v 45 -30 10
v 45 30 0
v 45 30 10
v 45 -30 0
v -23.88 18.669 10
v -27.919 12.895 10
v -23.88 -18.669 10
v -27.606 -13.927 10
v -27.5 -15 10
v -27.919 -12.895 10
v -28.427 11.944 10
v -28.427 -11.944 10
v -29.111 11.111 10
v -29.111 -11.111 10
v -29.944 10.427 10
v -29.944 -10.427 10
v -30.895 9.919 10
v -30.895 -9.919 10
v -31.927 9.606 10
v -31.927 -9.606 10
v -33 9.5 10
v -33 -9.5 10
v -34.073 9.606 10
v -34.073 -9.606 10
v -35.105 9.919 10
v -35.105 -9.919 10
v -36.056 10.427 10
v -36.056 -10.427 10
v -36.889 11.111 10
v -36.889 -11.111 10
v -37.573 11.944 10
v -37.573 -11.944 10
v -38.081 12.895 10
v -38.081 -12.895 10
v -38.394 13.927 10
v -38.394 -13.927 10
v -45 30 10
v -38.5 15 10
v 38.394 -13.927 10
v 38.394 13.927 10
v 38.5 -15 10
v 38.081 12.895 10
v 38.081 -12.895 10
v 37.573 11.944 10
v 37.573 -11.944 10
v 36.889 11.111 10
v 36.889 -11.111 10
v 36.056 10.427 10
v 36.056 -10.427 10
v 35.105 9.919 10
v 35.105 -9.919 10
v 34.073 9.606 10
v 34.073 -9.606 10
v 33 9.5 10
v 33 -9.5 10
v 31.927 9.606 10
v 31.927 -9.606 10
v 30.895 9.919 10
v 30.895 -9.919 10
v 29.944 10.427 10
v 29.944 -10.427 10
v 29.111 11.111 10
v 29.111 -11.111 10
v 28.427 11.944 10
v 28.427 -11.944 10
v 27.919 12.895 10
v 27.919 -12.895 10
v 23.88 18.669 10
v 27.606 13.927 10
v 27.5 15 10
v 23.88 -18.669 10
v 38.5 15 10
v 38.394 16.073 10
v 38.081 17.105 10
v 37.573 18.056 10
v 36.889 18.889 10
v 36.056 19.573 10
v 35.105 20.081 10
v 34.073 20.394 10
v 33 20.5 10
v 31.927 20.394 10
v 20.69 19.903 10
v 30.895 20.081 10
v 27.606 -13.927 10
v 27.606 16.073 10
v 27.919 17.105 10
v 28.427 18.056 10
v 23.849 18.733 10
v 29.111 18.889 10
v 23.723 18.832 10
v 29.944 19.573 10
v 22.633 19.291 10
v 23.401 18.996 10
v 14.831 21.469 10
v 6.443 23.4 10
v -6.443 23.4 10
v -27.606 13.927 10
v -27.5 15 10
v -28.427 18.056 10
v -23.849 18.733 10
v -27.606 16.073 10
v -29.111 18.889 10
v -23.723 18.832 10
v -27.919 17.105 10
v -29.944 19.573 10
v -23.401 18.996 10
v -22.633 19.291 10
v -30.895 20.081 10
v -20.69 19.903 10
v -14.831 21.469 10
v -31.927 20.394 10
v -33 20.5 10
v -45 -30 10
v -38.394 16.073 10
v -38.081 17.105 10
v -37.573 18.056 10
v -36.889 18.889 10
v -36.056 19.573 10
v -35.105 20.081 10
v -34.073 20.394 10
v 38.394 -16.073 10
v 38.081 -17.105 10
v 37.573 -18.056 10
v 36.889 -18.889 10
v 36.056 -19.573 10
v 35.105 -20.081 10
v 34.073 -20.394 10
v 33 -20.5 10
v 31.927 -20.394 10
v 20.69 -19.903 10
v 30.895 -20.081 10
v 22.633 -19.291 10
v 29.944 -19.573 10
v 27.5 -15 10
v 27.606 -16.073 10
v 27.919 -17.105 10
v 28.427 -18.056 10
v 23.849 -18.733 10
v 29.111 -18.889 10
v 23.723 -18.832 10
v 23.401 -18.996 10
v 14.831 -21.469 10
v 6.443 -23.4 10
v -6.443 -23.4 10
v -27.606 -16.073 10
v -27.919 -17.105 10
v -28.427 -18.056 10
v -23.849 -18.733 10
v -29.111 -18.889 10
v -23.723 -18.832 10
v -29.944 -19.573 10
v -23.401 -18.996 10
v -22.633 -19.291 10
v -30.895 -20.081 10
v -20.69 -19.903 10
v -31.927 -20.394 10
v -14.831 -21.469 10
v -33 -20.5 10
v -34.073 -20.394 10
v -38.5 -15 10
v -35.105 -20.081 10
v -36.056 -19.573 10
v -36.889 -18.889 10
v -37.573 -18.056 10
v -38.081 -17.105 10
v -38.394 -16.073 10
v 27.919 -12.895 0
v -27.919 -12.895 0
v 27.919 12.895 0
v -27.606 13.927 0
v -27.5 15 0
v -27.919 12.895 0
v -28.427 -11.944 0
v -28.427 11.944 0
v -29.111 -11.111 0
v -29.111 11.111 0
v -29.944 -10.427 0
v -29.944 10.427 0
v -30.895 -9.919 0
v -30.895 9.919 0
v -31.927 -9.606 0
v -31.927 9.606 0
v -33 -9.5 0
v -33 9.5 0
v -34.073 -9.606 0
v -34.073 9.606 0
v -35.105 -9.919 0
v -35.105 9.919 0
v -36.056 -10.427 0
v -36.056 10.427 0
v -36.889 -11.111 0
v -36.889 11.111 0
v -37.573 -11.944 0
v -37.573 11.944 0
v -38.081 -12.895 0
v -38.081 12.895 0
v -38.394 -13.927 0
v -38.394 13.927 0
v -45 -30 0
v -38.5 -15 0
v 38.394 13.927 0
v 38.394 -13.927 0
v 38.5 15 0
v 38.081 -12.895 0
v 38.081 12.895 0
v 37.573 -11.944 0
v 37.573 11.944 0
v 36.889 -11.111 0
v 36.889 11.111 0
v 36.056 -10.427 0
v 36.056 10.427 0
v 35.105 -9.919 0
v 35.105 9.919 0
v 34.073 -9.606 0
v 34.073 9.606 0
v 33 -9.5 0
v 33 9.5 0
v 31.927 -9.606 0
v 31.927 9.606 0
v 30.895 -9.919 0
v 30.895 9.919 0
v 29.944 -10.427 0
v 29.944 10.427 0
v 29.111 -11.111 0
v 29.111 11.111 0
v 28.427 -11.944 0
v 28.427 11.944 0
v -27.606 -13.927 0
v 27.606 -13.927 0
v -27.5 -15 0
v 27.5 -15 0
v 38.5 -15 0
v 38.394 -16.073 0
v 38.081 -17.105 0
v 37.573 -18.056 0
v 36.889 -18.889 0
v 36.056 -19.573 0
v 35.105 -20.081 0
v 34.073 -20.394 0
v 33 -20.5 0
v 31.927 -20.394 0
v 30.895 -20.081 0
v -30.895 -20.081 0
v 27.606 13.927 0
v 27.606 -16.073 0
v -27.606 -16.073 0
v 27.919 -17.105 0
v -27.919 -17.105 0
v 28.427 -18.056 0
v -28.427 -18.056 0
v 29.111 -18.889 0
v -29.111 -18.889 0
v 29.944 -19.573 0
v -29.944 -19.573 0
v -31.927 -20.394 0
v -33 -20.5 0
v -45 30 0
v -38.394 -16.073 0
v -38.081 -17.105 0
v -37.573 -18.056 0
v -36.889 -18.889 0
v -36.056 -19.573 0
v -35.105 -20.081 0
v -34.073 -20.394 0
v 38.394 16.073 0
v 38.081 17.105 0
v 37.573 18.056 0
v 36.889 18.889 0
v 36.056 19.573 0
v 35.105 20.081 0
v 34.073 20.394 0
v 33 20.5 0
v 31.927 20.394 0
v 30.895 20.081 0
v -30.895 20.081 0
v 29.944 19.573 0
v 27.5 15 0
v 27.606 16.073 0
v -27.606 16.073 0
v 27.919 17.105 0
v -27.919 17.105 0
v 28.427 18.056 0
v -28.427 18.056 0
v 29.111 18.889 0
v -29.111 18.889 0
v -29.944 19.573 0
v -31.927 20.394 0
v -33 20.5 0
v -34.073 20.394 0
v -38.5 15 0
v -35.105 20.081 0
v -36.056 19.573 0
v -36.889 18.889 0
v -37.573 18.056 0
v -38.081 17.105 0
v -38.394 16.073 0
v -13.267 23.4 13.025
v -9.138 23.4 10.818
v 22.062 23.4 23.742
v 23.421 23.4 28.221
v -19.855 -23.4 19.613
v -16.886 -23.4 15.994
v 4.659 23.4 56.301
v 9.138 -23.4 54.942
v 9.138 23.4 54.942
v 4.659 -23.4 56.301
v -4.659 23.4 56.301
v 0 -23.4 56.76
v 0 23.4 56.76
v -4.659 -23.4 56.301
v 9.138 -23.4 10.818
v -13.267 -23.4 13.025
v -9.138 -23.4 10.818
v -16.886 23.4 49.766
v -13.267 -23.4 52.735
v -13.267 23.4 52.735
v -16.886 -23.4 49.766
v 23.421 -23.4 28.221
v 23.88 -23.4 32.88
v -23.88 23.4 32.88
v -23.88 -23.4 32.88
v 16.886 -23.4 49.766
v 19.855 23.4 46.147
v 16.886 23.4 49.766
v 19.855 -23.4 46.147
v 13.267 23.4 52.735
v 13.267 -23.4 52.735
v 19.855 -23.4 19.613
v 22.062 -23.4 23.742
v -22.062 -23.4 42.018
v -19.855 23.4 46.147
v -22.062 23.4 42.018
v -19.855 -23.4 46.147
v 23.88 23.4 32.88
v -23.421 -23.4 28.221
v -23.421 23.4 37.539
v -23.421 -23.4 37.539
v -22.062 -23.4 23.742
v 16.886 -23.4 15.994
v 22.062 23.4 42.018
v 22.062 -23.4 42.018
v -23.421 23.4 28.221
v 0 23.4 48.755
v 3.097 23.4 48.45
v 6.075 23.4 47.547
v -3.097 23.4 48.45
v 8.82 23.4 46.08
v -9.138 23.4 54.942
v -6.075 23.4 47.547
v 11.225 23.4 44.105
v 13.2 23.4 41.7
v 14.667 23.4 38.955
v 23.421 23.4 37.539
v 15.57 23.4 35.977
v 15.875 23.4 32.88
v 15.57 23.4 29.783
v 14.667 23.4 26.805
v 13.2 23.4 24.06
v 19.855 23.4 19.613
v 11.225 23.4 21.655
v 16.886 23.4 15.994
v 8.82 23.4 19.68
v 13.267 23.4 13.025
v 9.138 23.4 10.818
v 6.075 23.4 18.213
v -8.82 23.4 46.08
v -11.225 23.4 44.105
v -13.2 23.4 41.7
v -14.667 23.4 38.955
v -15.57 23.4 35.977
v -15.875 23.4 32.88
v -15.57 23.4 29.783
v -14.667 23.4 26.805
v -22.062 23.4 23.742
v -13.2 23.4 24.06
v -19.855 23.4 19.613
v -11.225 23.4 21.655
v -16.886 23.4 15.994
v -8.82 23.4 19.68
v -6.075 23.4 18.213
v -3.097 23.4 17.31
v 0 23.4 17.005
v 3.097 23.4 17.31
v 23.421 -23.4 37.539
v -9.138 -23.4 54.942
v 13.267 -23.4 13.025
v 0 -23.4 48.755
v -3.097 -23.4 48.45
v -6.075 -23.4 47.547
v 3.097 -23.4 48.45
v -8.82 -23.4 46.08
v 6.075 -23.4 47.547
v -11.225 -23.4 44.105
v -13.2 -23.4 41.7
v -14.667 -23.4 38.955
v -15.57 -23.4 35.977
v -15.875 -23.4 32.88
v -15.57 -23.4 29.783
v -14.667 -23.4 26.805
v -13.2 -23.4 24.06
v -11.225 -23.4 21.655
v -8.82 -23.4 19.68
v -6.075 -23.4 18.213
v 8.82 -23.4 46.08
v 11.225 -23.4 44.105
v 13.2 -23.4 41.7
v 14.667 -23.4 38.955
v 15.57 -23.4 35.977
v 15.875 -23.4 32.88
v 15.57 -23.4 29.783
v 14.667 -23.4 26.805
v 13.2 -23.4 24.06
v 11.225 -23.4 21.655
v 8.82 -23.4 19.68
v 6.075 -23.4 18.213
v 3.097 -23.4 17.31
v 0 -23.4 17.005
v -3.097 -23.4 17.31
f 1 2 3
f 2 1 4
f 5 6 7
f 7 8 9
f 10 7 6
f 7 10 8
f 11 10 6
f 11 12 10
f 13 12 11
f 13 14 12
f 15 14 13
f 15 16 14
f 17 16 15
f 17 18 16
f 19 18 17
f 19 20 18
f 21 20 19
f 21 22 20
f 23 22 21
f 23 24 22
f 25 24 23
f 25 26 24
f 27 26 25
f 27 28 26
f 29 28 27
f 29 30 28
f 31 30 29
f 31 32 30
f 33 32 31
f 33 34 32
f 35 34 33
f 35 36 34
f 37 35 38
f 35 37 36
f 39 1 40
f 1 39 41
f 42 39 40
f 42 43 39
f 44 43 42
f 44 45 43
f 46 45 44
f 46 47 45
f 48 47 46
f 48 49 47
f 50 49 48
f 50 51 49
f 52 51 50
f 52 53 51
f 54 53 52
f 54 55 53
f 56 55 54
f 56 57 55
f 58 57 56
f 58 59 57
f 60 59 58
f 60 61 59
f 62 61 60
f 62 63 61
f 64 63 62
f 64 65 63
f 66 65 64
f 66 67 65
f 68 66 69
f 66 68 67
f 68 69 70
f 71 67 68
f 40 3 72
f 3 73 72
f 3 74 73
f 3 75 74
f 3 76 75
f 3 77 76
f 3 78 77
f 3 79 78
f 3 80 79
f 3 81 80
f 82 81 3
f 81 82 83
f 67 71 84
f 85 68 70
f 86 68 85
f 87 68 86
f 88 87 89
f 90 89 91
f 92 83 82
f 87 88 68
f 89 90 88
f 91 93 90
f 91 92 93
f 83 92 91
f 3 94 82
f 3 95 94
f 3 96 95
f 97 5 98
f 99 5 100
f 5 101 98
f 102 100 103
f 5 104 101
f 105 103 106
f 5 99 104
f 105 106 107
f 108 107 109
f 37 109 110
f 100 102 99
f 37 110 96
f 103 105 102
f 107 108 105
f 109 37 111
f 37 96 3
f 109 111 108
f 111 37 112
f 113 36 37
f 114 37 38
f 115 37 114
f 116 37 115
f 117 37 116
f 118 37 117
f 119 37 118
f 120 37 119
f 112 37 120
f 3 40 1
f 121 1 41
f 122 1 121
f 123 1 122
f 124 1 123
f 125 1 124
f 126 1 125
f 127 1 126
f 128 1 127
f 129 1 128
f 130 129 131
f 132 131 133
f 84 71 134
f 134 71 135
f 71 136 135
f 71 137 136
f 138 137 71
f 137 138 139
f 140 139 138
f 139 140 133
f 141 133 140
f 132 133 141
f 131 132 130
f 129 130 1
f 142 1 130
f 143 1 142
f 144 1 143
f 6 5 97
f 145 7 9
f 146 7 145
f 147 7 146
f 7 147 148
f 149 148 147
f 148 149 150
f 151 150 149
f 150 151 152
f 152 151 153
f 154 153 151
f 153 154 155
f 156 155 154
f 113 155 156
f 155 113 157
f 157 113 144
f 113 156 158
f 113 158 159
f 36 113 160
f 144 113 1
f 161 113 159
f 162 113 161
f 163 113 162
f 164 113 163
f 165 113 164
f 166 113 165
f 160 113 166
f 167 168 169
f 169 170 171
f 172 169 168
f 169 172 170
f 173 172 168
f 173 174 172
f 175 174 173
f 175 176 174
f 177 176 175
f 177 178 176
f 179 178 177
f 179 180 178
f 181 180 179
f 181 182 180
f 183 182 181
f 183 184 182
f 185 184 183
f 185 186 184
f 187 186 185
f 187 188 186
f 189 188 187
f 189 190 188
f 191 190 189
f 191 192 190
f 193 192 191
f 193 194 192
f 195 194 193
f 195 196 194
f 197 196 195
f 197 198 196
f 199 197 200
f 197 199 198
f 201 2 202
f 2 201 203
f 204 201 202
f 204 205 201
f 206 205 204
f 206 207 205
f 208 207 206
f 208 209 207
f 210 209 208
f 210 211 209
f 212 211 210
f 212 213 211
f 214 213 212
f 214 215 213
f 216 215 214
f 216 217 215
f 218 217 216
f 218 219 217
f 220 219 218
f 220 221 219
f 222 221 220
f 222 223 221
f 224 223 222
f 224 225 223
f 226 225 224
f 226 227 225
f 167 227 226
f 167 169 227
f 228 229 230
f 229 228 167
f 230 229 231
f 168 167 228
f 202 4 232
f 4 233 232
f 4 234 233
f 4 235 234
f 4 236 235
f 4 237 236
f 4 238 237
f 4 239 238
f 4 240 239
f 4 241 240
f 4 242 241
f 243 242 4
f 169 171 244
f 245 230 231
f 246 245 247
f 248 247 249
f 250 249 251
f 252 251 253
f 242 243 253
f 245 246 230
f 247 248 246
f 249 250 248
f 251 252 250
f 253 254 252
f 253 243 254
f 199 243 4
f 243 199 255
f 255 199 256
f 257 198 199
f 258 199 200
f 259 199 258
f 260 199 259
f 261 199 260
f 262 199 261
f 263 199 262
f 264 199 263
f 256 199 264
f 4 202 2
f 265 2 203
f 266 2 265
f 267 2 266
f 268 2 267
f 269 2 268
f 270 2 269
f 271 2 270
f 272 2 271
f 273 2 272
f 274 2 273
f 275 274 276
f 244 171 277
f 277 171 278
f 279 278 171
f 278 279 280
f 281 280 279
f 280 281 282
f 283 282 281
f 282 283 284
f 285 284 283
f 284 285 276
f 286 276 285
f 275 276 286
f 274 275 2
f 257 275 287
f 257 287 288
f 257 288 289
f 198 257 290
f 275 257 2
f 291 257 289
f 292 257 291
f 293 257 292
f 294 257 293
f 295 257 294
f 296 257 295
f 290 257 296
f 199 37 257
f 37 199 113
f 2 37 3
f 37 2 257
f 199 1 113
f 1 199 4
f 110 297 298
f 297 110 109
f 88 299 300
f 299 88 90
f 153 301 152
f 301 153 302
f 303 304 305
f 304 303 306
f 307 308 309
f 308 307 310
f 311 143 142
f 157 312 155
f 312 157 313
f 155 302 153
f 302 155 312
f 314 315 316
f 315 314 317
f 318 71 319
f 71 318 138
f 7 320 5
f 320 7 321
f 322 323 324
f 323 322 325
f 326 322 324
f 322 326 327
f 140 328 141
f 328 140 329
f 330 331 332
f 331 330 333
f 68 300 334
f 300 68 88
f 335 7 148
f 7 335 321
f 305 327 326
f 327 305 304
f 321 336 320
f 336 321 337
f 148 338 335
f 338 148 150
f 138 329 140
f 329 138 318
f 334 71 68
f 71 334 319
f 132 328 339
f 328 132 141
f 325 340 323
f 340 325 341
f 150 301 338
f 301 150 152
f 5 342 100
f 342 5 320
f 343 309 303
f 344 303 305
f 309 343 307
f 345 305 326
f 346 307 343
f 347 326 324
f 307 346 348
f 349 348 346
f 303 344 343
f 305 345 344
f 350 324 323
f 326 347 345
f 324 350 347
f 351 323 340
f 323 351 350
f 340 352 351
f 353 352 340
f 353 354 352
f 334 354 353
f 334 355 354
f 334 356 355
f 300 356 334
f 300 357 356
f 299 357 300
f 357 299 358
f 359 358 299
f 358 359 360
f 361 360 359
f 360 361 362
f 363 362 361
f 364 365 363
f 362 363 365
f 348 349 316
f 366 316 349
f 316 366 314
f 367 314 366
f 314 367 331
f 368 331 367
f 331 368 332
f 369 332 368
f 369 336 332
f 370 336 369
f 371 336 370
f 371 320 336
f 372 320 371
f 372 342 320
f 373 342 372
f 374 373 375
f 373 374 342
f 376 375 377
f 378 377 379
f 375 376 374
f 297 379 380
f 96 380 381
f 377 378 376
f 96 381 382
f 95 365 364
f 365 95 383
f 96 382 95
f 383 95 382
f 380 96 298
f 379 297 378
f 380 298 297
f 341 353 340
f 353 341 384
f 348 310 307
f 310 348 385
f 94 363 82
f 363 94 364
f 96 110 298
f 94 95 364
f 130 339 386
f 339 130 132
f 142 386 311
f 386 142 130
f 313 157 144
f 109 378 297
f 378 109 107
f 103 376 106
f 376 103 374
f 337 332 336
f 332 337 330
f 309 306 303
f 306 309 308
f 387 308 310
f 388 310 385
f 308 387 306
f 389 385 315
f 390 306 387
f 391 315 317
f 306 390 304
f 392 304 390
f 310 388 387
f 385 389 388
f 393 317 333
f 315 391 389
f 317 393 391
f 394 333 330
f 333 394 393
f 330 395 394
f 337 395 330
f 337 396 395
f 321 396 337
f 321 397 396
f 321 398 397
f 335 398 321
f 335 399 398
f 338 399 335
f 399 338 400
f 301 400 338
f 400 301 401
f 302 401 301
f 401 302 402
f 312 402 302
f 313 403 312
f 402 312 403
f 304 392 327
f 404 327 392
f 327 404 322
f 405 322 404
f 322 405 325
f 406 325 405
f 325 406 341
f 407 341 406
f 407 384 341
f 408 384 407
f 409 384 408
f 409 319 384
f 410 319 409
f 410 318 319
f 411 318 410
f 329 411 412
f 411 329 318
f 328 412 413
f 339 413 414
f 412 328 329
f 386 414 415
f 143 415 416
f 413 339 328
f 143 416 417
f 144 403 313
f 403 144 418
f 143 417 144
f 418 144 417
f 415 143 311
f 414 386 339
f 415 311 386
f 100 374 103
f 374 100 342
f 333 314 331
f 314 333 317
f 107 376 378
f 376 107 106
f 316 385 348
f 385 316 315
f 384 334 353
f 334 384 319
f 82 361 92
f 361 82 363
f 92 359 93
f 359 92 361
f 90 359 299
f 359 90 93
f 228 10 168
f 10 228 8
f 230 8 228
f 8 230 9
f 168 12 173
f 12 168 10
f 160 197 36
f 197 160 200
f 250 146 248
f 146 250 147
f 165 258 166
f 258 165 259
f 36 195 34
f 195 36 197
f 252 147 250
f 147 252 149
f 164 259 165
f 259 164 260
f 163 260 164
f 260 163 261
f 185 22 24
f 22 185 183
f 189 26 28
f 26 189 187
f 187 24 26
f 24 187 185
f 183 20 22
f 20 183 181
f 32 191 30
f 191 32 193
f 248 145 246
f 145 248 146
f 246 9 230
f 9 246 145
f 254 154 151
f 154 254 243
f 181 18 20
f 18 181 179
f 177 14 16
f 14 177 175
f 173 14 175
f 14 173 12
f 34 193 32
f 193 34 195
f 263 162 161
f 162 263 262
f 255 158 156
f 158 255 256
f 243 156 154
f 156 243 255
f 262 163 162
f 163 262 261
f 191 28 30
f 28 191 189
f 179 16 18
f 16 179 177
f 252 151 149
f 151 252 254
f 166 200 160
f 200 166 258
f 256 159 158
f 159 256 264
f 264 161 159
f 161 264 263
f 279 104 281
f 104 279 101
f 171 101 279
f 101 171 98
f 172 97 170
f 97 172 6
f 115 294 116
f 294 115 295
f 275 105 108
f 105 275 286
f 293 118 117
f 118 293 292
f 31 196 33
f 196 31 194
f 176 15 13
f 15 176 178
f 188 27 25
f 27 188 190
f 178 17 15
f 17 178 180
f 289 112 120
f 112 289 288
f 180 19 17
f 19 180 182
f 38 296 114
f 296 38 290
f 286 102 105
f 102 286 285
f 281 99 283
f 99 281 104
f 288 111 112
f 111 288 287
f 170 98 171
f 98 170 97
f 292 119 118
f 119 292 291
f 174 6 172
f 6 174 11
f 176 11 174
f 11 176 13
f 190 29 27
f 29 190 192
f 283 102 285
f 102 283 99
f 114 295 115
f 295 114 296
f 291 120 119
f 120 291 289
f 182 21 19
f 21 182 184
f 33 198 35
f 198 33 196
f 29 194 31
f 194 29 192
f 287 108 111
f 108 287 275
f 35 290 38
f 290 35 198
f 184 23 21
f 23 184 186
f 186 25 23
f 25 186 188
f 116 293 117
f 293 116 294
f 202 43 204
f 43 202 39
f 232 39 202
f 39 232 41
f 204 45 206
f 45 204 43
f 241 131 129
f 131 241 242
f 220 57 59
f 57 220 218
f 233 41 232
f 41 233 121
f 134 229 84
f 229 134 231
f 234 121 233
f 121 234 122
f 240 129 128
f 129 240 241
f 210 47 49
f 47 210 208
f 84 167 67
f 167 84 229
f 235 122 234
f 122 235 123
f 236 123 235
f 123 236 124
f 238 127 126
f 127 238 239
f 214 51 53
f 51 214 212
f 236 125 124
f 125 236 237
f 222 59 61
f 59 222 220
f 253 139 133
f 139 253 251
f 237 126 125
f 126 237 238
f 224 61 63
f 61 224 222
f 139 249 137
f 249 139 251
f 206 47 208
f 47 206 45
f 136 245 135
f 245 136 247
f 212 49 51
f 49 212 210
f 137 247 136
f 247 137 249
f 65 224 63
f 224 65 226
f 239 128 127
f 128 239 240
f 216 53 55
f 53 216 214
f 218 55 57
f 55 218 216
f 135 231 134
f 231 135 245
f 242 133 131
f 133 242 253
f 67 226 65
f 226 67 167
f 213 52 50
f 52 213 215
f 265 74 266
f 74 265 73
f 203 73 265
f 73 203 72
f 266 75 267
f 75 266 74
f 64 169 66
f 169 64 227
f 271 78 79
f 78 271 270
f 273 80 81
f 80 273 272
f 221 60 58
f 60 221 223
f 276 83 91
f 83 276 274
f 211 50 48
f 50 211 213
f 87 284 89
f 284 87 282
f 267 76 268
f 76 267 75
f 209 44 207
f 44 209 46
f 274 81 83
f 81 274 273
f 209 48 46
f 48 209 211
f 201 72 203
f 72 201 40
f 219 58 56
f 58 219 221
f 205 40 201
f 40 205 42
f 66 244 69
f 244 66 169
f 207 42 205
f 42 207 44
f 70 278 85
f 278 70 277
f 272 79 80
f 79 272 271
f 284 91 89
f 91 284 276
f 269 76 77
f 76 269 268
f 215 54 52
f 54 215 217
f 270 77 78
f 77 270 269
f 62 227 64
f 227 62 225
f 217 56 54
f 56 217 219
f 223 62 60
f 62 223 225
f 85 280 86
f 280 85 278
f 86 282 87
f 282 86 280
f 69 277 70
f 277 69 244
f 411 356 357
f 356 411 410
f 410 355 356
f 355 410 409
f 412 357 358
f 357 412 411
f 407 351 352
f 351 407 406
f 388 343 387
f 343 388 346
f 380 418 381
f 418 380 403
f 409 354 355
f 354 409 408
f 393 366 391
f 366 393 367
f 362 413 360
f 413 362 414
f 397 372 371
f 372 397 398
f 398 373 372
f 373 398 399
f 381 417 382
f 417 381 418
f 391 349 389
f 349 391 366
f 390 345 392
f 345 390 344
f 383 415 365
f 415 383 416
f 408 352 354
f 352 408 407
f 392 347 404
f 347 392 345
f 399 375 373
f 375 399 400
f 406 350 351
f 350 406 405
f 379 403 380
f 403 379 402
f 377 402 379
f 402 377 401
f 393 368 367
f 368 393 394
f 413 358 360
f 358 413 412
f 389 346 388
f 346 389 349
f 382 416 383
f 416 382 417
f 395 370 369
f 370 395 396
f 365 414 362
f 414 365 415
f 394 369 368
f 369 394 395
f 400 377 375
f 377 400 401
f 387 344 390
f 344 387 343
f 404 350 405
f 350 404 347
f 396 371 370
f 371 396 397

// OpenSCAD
$fn = 32;

// ----------------------------------------------------------------------
// Bearing block: 90 x 60 mm base, 31.75 mm bore at 32.88 mm
// ----------------------------------------------------------------------

// --- parameters (mm) ---
base_w = 90;              // base width
base_d = 60;              // base depth
base_t = 10;              // base thickness
bore_d = 31.75;           // shaft / bearing bore
house_r = 23.88;          // housing outer radius
house_len = 46.8;         // housing length along the shaft
foot_w = 47.76;           // foot width under the housing
foot_len = 36.8;          // foot length along the shaft
axis_z = 32.88;           // bore axis height above the base
holes_d = 11;             // mounting holes
hole_x = 33;              // mounting hole spacing

difference() {
  union() {
    /* base plate with its underside on z = 0 */
    translate([0, 0, base_t / 2]) cube([base_w, base_d, base_t], center = true);
    /* hull foot: a straight web blending into the round housing */
    hull() {
      translate([0, 0, base_t - 0.5]) cube([foot_w, foot_len, 1.6], center = true);
      translate([0, 0, axis_z]) rotate([-90, 0, 0]) cylinder(h = house_len, d = 2 * house_r, center = true);
    }
  }
  /* bore through the housing, 2.5 mm clear on both sides */
  translate([0, 0, axis_z]) rotate([-90, 0, 0]) cylinder(h = house_len + 5, d = bore_d, center = true);
  /* mounting holes through the base plate */
  for (hx = [-33, 33]) {
    for (hy = [-15, 15]) {
      translate([hx, hy, -2.5]) cylinder(h = base_t + 5, d = holes_d);
    }
  }
}
